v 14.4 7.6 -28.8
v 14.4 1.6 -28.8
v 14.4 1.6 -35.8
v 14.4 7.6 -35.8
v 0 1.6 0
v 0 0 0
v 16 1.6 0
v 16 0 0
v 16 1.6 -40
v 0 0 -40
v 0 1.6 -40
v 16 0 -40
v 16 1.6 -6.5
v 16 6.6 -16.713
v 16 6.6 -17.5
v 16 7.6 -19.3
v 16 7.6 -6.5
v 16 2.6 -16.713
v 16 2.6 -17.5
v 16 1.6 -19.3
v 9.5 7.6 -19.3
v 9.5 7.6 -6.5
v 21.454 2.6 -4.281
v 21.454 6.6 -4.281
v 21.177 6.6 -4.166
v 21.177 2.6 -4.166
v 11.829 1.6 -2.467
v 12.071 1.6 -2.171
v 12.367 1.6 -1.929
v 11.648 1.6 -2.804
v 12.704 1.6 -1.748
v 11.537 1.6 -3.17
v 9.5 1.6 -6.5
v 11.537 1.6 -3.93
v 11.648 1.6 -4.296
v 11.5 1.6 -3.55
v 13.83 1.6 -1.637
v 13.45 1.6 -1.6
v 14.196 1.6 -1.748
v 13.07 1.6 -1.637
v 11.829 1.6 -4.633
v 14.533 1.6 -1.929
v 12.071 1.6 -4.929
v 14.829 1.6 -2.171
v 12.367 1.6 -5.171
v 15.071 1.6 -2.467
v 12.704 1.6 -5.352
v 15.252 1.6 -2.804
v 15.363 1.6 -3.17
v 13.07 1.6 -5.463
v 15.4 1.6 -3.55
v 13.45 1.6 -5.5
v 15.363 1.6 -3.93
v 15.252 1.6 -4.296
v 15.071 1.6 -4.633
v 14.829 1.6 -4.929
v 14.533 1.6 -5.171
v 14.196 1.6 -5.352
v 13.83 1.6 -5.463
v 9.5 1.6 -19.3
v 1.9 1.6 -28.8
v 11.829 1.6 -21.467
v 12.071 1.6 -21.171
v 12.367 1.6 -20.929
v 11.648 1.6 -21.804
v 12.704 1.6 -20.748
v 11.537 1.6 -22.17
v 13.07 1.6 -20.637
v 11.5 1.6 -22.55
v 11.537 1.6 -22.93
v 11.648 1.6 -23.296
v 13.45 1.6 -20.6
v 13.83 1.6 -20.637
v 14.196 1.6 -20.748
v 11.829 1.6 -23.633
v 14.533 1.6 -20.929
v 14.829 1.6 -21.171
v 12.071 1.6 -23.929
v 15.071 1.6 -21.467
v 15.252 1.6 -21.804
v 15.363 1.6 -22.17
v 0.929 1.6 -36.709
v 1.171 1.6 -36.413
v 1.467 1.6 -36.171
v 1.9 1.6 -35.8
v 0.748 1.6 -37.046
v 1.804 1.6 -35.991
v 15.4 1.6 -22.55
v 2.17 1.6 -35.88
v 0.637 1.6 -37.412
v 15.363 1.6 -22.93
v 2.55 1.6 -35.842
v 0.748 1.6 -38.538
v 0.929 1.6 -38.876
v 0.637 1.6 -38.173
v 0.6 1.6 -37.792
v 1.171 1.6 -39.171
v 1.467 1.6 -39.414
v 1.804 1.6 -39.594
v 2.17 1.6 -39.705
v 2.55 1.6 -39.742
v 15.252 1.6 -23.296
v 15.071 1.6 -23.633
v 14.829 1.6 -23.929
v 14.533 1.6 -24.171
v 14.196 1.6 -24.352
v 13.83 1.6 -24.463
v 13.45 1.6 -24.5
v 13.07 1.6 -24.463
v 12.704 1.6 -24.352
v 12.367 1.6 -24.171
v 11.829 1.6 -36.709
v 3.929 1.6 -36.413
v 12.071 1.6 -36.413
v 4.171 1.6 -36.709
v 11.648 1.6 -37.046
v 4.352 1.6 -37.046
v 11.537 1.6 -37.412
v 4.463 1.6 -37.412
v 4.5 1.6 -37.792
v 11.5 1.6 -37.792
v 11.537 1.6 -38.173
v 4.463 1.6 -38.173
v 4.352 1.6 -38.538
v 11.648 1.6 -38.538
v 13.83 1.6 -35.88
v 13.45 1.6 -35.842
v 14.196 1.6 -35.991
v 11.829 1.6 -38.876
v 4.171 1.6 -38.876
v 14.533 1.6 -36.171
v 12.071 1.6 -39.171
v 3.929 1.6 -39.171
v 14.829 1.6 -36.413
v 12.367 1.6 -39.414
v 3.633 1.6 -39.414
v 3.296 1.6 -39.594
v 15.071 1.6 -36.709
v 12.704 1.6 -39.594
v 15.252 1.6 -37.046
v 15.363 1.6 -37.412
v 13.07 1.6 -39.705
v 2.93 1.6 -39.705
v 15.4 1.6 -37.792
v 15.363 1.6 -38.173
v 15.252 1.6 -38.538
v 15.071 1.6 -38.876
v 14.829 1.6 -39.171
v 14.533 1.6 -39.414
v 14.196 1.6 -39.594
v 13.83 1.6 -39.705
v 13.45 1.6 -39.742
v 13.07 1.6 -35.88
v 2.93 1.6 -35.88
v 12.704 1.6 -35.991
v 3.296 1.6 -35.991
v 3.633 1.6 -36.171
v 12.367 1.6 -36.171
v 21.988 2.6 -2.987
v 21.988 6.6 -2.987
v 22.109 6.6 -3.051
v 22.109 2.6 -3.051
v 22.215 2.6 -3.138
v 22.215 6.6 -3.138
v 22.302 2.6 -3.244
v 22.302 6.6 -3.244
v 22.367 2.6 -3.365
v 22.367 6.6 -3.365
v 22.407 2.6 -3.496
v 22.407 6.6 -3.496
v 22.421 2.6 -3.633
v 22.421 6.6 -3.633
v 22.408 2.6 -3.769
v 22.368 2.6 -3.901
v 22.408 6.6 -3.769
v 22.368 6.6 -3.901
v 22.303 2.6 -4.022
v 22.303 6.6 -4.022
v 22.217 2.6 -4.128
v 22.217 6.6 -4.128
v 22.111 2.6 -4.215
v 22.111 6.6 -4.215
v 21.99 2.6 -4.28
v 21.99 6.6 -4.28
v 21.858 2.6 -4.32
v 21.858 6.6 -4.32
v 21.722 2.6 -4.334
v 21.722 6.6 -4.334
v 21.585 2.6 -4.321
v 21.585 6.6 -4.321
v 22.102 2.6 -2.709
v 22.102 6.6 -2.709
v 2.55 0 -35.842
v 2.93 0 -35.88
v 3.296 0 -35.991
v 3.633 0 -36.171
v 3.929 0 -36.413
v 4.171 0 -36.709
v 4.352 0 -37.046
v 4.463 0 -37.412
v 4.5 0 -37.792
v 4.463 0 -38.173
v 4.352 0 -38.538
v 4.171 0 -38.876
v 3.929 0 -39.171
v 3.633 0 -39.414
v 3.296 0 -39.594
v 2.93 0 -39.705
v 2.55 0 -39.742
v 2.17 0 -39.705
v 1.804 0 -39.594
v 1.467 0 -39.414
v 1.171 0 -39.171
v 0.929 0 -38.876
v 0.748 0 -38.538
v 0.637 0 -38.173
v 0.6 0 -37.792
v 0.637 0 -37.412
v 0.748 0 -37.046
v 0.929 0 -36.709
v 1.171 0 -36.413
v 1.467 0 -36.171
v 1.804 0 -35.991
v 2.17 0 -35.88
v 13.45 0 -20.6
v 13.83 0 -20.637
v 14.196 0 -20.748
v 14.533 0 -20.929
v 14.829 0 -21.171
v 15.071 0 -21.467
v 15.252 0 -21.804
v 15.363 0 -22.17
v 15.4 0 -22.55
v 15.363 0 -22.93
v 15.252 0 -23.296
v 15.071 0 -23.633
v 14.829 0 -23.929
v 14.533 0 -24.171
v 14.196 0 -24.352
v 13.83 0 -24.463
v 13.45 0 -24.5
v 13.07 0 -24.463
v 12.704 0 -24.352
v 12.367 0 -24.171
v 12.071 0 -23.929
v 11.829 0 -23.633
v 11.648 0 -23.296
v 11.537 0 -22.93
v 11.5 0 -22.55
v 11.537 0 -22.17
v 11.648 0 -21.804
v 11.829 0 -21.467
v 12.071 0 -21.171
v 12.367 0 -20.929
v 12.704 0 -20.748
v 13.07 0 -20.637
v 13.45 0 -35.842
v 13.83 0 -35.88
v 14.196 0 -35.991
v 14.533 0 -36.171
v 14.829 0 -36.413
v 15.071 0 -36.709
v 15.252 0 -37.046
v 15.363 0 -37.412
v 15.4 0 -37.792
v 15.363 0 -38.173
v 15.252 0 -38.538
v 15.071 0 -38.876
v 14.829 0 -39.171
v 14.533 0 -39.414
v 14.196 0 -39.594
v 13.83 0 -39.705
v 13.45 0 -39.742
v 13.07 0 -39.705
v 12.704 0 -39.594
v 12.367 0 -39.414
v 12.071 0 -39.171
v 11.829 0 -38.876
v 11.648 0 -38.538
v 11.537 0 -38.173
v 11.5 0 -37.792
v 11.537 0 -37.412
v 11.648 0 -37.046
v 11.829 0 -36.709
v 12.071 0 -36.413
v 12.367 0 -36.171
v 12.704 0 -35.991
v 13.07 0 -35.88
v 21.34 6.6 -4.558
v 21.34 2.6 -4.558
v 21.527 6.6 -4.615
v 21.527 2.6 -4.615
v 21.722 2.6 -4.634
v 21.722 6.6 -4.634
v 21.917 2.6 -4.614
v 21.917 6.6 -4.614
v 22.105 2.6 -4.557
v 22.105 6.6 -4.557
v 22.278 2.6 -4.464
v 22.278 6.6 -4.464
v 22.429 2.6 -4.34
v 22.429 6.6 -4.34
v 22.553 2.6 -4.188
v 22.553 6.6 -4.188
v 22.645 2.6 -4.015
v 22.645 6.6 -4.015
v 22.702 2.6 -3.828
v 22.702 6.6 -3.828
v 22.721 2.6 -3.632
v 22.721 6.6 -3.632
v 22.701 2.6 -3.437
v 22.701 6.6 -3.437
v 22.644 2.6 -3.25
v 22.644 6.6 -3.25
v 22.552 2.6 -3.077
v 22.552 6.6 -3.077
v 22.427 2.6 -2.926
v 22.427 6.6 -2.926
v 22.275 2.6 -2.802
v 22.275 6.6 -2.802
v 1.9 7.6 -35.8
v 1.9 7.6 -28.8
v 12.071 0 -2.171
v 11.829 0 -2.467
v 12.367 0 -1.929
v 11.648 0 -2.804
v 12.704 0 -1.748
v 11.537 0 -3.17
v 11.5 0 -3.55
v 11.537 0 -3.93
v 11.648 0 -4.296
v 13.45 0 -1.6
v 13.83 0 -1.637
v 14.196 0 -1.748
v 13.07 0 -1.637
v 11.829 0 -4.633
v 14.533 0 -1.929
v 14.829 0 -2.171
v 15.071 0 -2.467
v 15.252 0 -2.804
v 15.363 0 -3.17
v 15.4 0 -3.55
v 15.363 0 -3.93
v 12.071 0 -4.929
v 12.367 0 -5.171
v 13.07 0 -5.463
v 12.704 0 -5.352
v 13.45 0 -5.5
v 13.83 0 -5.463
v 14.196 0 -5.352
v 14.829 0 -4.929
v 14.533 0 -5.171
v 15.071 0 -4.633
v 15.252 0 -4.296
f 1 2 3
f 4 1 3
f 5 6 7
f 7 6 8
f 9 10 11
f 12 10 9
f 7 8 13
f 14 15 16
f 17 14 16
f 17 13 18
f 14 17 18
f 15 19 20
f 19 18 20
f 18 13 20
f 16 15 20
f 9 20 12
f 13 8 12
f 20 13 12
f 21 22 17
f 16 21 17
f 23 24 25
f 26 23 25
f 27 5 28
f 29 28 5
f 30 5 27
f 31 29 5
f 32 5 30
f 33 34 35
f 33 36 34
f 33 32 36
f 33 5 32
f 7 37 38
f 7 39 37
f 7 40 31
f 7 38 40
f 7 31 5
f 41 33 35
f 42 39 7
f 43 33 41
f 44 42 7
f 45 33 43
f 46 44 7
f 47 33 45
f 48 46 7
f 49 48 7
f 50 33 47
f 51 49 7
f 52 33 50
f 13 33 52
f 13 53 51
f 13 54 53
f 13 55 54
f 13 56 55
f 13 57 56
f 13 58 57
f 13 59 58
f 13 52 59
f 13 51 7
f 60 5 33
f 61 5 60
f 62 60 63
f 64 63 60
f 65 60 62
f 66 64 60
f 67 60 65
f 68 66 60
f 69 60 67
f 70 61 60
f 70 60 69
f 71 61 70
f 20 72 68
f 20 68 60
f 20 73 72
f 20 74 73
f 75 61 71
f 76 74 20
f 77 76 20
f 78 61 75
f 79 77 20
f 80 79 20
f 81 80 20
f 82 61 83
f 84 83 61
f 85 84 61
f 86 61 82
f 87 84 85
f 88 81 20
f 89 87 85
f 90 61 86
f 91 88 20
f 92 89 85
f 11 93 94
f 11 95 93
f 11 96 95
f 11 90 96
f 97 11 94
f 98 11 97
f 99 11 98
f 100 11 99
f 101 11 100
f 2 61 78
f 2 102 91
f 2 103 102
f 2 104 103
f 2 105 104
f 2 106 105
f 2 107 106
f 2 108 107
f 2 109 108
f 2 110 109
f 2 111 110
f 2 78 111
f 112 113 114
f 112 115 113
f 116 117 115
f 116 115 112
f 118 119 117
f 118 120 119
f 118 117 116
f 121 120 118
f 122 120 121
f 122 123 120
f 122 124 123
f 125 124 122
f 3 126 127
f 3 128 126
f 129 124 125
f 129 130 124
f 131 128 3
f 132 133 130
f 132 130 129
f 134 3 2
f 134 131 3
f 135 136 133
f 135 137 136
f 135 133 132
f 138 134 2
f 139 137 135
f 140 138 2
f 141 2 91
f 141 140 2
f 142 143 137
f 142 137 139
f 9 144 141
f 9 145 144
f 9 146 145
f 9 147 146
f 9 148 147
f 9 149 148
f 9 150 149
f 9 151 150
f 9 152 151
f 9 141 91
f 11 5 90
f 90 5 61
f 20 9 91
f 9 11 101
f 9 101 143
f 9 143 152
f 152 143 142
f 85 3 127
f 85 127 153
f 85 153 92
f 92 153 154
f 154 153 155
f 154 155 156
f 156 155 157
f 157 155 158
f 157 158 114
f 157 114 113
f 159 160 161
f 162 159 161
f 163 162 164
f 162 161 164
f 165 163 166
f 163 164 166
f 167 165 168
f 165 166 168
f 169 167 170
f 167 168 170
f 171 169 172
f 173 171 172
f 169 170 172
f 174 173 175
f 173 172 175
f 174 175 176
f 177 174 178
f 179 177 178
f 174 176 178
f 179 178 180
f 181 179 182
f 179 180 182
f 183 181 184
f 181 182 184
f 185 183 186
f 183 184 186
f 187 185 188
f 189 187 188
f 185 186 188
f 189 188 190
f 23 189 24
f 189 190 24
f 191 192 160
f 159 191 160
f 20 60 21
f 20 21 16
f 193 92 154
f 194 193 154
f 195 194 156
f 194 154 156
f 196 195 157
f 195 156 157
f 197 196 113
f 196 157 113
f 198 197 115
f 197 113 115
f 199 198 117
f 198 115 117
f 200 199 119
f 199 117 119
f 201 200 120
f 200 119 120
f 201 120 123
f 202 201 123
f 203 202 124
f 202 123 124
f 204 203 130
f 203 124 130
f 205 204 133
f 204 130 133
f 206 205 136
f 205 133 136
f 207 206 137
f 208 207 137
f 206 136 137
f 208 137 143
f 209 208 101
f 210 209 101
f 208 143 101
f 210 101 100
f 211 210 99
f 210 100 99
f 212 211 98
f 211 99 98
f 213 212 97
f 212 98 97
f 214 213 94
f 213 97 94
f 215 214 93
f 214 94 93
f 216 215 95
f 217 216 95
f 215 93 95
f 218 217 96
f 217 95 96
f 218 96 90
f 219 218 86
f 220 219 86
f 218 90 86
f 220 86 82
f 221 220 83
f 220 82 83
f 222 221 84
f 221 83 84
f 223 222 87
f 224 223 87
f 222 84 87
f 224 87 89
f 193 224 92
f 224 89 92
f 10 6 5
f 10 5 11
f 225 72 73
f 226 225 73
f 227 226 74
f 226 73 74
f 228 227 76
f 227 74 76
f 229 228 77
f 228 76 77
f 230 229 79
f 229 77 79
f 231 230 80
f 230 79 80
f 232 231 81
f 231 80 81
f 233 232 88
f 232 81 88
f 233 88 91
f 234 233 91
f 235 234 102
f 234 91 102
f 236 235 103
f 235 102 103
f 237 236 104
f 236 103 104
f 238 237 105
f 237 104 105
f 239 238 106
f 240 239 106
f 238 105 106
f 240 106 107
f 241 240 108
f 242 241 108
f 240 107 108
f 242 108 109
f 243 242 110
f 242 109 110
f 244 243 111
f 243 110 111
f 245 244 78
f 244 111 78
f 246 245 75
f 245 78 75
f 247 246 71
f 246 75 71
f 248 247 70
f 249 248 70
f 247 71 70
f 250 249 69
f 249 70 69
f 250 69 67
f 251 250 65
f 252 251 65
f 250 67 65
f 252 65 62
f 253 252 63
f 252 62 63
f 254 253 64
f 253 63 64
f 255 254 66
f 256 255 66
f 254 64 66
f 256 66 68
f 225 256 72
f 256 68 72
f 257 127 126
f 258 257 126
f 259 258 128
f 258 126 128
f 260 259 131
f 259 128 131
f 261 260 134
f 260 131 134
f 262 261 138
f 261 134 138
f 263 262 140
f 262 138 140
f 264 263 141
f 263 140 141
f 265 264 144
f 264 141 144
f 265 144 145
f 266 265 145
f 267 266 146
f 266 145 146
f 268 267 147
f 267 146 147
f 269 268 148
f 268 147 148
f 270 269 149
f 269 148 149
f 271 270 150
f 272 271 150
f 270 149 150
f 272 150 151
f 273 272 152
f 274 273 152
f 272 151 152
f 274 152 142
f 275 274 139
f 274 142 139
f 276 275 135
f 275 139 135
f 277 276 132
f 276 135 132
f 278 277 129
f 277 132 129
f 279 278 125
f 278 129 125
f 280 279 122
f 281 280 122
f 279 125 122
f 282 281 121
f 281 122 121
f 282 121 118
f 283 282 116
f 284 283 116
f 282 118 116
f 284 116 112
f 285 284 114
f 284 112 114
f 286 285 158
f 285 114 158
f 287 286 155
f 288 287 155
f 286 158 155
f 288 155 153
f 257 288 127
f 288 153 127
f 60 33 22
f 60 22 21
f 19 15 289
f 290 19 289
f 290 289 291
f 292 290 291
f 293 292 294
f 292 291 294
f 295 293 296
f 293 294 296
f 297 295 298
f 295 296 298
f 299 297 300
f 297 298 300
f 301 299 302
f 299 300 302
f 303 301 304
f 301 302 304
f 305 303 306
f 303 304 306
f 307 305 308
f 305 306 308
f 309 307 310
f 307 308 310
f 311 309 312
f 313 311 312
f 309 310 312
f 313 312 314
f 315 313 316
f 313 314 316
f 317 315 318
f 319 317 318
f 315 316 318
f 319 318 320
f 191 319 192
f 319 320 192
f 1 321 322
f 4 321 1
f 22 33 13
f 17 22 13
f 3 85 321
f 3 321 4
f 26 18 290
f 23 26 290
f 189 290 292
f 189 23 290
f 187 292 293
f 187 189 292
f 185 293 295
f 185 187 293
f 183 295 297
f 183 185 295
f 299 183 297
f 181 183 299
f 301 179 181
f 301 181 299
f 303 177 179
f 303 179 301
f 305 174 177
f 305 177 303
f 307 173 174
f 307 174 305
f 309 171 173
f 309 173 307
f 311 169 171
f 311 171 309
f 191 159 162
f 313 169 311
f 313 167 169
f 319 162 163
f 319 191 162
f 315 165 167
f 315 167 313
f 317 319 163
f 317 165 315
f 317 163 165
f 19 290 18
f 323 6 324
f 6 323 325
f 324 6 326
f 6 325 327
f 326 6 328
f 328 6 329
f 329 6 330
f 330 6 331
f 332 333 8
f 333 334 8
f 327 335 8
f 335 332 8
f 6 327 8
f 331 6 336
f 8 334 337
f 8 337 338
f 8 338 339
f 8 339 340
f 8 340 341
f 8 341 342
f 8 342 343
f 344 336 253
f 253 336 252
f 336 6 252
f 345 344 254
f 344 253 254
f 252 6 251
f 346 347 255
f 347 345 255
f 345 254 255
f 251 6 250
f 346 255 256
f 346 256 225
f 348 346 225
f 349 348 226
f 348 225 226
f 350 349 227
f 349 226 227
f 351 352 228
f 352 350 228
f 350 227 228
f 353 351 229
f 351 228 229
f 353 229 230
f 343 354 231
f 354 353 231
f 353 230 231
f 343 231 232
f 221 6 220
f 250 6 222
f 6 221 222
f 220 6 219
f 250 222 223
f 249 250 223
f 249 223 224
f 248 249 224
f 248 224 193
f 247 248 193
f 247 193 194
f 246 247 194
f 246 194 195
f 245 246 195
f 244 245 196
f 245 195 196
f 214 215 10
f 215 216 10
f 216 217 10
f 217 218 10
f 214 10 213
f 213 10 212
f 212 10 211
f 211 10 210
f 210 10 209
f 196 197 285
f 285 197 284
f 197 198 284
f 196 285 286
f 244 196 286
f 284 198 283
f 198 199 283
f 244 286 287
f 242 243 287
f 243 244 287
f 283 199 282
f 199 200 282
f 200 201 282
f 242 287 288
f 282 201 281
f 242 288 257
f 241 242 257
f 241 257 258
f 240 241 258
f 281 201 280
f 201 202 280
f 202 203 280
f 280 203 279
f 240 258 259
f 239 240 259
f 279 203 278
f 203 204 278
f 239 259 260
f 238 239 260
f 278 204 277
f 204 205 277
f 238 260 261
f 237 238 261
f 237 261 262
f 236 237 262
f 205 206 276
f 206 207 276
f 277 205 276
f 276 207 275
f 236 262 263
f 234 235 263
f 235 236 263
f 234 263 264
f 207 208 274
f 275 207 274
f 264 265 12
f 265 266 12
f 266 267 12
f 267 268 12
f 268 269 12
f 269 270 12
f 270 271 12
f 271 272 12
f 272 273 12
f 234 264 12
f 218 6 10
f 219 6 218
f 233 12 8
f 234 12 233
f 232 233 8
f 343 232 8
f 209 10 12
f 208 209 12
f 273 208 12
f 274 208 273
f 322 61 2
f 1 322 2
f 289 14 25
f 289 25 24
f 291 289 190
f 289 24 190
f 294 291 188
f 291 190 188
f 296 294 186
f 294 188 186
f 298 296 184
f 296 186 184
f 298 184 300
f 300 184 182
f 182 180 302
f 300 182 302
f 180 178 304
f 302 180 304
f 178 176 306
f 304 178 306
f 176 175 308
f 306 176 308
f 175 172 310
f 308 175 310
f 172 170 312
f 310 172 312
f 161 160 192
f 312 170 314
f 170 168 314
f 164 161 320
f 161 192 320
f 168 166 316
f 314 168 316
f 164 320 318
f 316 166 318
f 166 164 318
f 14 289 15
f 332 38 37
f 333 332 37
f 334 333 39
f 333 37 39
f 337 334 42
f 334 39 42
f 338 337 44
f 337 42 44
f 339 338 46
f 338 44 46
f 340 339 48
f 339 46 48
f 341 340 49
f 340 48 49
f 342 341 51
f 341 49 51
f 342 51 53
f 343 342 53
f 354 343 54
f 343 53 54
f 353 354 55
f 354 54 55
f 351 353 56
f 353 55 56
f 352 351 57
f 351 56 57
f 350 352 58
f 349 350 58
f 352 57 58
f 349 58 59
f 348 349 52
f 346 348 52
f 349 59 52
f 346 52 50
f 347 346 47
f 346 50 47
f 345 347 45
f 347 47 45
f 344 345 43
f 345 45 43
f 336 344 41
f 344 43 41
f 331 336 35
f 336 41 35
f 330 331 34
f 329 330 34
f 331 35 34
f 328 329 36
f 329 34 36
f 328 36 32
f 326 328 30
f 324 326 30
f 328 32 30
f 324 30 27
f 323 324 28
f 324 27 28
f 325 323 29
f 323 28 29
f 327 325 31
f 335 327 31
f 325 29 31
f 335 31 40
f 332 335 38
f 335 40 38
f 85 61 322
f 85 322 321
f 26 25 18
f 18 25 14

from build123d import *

# Parameters (mm, degrees)
SKETCH1_W           = 16
SKETCH1_H           = 40
BOSS_EXTRUDE1_DEPTH = 1.6
SKETCH2_R           = 1.95
CUT_EXTRUDE1_DEPTH  = 1.6
SKETCH3_W           = 12.5
SKETCH3_H           = 7
SKETCH3_W_2         = 6.5
SKETCH3_H_2         = 12.8
BOSS_EXTRUDE2_DEPTH = 6
BOSS_EXTRUDE3_START = 1
BOSS_EXTRUDE3_DEPTH = 4


with BuildPart() as part:
    # Sketch1 → Boss-Extrude1 (new body)
    with BuildSketch(Plane(origin=(0, 0, 0), x_dir=(1, 0, 0), z_dir=(0, 1, 0))):
        with Locations((8, 20)):
            Rectangle(SKETCH1_W, SKETCH1_H)
    extrude(amount=BOSS_EXTRUDE1_DEPTH)

    # Sketch2 → Cut-Extrude1 (cut)
    with BuildSketch(Plane(origin=(0, 1.6, 0), x_dir=(1, 0, 0), z_dir=(0, 1, 0))):
        with Locations(Location((2.55, 37.792201536, 0), (0, 0, 270))):
            Circle(SKETCH2_R)
        with Locations(Location((13.45, 37.792201536, 0), (0, 0, 270))):
            Circle(SKETCH2_R)
        with Locations(Location((13.45, 3.55, 0), (0, 0, 270))):
            Circle(SKETCH2_R)
        with Locations(Location((13.45, 22.55, 0), (0, 0, 270))):
            Circle(SKETCH2_R)
    extrude(amount=-CUT_EXTRUDE1_DEPTH, mode=Mode.SUBTRACT)

    # Sketch3 → Boss-Extrude2 (add)
    with BuildSketch(Plane(origin=(0, 1.6, 0), x_dir=(1, 0, 0), z_dir=(0, 1, 0))):
        with Locations((8.15, 32.3)):
            Rectangle(SKETCH3_W, SKETCH3_H)
        with Locations((12.75, 12.9)):
            Rectangle(SKETCH3_W_2, SKETCH3_H_2)
    extrude(amount=BOSS_EXTRUDE2_DEPTH)

    # Sketch4 → Boss-Extrude3 (add)
    with BuildSketch(Plane(origin=(0.760107299, 7.6, -17.342959561), x_dir=(1, 0, 0), z_dir=(0, -1, 0)).offset(BOSS_EXTRUDE3_START)):
        with BuildLine():
            Line((15.239892701, -0.157040439), (20.579395829, 12.784740982))
            ThreePointArc((20.579395829, 12.784740982), (21.885201868, 13.32776086), (21.34218199, 14.633566899))
            Line((21.34218199, 14.633566899), (21.227764066, 14.356243012))
            ThreePointArc((21.227764066, 14.356243012), (21.60787798, 13.442178784), (20.693813753, 13.06206487))
            Line((20.693813753, 13.06206487), (20.416533297, 13.176588062))
            Line((20.416533297, 13.176588062), (15.239892701, 0.629549605))
            Line((15.239892701, 0.629549605), (15.239892701, -0.157040439))
        make_face()
    extrude(amount=BOSS_EXTRUDE3_DEPTH)


solid = part.part
